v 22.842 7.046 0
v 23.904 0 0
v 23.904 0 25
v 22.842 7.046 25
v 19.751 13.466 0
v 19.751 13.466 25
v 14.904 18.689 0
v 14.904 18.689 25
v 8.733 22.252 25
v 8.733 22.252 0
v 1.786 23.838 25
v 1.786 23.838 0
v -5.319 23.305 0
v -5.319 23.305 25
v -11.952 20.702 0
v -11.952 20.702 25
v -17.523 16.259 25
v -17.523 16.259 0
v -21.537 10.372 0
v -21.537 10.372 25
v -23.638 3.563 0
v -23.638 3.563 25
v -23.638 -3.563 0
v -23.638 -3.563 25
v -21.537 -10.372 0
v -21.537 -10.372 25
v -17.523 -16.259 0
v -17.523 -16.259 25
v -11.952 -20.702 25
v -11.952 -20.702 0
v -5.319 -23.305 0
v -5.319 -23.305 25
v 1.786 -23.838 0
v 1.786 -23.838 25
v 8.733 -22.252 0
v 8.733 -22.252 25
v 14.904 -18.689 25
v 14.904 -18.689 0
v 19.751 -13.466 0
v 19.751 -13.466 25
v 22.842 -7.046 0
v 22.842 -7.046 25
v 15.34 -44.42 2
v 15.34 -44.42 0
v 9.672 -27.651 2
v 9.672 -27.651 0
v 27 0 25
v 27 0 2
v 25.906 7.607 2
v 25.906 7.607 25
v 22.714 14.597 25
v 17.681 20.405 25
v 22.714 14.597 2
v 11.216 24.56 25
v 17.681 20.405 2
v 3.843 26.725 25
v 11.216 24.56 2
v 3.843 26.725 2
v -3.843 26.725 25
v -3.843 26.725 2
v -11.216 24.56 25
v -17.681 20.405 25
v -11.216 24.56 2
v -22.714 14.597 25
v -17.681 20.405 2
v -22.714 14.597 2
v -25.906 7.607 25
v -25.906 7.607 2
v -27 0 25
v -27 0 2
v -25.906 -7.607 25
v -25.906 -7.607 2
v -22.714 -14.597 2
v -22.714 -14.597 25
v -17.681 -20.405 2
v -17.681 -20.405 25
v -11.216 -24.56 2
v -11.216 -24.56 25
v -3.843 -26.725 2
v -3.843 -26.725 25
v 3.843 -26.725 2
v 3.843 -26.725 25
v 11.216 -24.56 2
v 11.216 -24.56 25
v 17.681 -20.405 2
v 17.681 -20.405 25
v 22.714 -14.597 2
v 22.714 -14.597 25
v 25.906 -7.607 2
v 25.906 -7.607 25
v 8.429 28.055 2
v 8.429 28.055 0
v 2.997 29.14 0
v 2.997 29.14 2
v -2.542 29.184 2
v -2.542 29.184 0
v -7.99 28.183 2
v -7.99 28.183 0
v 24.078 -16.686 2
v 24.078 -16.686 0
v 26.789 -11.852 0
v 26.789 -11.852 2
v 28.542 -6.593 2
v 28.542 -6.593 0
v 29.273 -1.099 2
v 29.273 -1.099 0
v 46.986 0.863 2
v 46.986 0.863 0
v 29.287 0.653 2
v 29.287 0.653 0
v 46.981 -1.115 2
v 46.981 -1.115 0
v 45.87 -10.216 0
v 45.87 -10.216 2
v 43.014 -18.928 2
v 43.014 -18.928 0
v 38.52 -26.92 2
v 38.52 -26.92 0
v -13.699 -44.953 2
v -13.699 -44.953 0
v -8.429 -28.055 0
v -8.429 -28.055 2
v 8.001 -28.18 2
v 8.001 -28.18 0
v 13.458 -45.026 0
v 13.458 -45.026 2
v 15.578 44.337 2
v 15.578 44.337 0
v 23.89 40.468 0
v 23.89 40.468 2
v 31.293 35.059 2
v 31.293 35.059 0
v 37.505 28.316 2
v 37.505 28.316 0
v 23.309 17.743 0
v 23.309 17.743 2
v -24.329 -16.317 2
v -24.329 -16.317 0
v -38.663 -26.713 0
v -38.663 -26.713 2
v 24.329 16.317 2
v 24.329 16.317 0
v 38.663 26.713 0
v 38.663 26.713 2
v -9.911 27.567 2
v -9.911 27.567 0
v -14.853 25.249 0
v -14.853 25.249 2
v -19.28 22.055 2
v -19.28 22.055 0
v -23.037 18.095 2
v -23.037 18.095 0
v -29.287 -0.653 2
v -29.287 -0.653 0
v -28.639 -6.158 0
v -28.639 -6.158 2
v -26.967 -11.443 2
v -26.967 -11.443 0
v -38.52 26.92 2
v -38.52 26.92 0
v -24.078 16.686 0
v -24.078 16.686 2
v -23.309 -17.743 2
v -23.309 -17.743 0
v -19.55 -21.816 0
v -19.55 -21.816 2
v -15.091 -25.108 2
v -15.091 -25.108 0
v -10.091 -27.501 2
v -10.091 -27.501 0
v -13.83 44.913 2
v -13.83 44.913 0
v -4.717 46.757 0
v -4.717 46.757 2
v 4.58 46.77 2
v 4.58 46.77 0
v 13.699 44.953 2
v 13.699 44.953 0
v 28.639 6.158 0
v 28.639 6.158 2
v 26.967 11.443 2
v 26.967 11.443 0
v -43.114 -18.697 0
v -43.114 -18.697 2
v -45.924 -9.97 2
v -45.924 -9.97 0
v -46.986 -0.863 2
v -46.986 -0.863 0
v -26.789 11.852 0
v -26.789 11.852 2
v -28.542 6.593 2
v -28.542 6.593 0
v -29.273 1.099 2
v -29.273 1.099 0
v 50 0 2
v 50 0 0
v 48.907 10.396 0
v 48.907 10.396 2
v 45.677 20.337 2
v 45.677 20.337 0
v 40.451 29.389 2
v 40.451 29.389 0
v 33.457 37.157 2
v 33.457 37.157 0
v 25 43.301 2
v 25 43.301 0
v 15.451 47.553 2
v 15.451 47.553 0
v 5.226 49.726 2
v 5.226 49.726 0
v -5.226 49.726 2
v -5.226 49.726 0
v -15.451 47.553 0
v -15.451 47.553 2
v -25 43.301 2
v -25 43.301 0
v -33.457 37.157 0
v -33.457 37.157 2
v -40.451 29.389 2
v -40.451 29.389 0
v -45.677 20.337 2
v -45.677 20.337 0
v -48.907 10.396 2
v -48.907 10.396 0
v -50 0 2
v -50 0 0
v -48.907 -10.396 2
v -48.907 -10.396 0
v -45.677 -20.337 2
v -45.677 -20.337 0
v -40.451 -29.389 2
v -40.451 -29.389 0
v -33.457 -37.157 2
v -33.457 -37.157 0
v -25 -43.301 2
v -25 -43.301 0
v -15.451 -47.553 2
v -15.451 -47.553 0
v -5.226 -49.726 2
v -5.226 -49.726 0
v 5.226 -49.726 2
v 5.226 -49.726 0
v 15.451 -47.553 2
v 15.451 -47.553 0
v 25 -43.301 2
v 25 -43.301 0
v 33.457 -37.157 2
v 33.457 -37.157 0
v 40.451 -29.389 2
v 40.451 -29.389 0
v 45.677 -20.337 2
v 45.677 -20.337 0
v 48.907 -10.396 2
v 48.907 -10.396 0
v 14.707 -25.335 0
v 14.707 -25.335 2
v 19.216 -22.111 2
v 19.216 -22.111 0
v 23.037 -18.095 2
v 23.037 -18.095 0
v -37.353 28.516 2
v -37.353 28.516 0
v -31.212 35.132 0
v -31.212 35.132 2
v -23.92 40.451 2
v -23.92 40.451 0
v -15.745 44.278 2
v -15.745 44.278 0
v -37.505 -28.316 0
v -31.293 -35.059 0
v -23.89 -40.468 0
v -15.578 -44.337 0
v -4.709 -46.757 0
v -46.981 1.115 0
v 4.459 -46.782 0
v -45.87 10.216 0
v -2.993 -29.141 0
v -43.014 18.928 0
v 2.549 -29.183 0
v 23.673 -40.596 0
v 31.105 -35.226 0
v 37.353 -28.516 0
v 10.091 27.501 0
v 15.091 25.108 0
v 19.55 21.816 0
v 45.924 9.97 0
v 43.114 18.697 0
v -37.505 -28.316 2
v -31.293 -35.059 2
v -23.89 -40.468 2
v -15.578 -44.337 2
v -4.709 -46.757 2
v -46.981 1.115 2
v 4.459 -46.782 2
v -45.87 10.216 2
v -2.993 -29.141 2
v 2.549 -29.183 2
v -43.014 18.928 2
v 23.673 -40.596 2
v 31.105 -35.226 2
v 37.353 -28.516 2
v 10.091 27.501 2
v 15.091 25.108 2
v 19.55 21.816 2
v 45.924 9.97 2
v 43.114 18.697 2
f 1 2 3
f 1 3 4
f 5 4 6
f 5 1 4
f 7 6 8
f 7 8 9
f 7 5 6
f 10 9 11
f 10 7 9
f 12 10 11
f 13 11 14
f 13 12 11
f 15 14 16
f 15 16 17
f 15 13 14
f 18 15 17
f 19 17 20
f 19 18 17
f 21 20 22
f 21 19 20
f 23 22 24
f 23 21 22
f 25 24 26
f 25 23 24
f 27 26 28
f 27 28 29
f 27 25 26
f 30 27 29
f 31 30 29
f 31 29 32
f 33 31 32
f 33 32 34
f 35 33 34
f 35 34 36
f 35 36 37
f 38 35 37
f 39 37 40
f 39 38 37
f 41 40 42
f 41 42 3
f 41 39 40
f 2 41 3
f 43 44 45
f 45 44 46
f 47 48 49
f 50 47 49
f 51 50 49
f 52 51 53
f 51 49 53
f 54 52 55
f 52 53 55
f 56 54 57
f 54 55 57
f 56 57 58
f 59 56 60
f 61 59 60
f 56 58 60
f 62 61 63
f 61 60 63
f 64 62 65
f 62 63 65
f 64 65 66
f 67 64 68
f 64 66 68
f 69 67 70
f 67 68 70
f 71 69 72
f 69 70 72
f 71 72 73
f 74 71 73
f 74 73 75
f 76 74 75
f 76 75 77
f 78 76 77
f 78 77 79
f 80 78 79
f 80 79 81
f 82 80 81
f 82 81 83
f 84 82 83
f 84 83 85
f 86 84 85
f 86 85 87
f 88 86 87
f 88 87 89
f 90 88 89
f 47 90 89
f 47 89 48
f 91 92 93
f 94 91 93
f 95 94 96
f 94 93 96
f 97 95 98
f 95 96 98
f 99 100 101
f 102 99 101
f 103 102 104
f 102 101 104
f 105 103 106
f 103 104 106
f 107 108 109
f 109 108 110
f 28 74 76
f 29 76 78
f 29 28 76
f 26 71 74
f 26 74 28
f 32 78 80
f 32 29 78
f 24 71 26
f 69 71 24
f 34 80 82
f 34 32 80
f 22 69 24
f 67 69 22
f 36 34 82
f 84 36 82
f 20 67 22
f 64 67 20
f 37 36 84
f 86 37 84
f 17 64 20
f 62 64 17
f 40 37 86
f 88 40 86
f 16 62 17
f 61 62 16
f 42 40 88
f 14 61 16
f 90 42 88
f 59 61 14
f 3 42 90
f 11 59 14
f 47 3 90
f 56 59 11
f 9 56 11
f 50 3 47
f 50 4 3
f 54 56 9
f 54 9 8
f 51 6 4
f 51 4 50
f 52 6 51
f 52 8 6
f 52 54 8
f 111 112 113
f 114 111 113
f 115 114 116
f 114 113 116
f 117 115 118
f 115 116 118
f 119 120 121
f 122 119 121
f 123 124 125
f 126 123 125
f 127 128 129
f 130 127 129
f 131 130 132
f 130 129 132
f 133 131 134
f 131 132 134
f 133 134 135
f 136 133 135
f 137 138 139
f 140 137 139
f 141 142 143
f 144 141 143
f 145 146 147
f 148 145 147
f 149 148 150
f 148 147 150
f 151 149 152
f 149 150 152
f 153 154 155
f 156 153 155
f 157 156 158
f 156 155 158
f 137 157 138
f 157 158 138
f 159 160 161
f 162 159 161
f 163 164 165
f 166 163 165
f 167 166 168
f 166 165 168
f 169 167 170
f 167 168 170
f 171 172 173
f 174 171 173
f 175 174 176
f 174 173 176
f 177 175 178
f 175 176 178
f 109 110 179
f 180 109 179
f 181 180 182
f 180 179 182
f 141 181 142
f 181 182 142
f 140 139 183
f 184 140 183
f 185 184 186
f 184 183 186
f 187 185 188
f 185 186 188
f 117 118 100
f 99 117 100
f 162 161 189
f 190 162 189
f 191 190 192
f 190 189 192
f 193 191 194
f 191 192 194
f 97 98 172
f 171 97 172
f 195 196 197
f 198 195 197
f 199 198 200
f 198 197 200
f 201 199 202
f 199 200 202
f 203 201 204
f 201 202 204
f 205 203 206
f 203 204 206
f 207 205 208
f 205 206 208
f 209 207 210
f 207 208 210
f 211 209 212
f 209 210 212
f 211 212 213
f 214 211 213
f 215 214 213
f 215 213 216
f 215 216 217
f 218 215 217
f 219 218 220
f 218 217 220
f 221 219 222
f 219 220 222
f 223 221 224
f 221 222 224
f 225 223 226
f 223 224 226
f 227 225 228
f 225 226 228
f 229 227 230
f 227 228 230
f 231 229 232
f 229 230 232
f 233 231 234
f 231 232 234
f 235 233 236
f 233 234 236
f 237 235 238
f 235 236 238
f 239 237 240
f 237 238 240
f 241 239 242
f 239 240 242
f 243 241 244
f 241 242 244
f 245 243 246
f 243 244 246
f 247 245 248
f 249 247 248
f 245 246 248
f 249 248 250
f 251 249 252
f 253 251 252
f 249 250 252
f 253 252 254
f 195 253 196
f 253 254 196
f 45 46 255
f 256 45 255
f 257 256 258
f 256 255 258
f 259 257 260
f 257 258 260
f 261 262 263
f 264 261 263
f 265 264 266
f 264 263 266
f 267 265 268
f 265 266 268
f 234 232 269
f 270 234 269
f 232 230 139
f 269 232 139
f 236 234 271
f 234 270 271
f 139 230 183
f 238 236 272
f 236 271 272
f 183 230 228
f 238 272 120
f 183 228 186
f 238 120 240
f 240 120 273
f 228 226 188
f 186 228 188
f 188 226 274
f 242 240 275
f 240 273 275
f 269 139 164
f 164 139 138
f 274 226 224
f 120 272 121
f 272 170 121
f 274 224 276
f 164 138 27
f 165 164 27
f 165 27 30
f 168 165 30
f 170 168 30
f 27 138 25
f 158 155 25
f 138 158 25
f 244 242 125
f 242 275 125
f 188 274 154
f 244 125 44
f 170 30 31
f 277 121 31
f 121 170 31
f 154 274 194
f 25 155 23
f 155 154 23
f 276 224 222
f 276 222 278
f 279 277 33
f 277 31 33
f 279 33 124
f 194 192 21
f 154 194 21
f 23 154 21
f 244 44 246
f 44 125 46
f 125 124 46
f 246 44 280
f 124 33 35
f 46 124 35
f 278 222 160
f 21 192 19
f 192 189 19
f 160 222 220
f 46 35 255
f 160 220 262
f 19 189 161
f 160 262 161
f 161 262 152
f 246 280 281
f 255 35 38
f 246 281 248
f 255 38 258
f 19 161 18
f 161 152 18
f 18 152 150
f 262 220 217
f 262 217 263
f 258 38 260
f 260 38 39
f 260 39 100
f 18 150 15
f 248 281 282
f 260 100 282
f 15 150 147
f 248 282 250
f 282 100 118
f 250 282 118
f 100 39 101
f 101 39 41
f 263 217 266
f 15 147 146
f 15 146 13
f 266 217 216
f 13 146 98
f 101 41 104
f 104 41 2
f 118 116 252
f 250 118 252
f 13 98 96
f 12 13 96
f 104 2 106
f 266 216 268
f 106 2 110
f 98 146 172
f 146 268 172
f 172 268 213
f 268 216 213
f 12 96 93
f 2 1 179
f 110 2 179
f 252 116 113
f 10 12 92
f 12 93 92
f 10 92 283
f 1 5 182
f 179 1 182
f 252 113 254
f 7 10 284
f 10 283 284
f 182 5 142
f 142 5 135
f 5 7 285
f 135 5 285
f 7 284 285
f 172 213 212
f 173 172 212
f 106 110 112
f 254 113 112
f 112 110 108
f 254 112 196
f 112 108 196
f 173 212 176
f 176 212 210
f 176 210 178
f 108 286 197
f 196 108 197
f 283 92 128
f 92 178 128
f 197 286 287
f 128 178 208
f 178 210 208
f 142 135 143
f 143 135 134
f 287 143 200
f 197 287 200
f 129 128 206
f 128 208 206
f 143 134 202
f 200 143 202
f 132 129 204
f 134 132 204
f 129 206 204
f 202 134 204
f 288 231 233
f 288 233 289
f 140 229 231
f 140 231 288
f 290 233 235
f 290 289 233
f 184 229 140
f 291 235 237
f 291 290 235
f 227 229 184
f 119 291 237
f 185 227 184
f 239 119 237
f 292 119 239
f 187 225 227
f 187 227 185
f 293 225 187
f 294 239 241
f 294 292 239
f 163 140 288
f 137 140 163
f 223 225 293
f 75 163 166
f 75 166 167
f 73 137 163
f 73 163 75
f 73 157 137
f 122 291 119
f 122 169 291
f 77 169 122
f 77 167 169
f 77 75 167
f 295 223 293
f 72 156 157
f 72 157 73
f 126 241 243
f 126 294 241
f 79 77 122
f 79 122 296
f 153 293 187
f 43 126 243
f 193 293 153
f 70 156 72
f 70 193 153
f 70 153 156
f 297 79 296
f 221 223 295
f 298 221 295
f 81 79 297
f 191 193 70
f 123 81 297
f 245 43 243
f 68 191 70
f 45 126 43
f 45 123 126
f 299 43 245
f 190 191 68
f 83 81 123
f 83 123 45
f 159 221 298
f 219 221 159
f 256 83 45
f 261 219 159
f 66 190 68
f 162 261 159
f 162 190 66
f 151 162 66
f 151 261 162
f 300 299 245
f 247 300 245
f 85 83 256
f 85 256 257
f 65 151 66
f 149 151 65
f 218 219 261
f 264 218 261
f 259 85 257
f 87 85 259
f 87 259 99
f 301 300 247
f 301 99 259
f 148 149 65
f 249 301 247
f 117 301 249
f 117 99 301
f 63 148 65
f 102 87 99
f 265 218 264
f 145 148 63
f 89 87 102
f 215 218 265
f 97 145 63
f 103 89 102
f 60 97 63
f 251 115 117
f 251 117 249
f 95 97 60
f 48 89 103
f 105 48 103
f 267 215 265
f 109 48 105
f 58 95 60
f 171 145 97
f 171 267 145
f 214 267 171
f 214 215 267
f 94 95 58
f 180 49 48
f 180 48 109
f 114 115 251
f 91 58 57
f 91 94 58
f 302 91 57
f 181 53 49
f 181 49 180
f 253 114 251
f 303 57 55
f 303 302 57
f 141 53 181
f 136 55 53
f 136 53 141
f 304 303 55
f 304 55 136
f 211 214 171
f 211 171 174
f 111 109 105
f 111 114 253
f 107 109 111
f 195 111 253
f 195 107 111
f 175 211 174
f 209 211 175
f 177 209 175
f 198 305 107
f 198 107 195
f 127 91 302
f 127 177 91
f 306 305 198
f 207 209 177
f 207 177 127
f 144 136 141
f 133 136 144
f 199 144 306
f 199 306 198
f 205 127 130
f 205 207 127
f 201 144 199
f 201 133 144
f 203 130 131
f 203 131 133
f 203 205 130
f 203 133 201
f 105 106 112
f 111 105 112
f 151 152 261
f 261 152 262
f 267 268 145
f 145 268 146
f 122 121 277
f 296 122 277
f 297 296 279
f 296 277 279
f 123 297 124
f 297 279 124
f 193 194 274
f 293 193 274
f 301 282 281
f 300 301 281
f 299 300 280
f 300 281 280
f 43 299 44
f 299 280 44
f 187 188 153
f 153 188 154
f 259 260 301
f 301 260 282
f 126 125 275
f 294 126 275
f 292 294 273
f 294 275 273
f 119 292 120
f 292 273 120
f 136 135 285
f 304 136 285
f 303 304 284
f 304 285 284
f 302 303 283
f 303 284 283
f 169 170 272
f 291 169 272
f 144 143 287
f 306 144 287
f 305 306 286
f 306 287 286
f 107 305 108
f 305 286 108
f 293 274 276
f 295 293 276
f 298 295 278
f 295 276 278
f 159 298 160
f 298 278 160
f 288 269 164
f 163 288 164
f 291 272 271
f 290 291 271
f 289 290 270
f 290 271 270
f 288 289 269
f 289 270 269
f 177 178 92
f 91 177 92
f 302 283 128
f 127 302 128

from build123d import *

# Parameters (mm, degrees)
F0_R     = 50
F0_R_2   = 27
F1_DEPTH = 2
F2_R     = 27
F2_R_2   = 23.9045
F3_DEPTH = 25


with BuildPart() as f1:
    # F0 (on Top) → F1 (new body)
    with BuildSketch(Plane.XY):
        Circle(F0_R)
        with BuildLine():
            ThreePointArc((46.986111, 0.863073), (46.992056, 0.431555), (46.994037, 0))
            ThreePointArc((46.994037, 0), (46.990732, -0.55736), (46.980816, -1.114641))
            ThreePointArc((46.980816, -1.114641), (44.654947, -14.641558), (38.519864, -26.919502))
            ThreePointArc((38.519864, -26.919502), (37.944888, -27.724087), (37.35311, -28.516394))
            ThreePointArc((37.35311, -28.516394), (27.520519, -38.092789), (15.340338, -44.419743))
            ThreePointArc((15.340338, -44.419743), (14.40225, -44.732703), (13.457784, -45.025855))
            ThreePointArc((13.457784, -45.025855), (-0.125812, -46.993869), (-13.698676, -44.953151))
            ThreePointArc((-13.698676, -44.953151), (-14.641558, -44.654947), (-15.577957, -44.336969))
            ThreePointArc((-15.577957, -44.336969), (-27.724087, -37.944888), (-37.505261, -28.315984))
            ThreePointArc((-37.505261, -28.315984), (-38.092789, -27.520519), (-38.663448, -26.712868))
            ThreePointArc((-38.663448, -26.712868), (-44.732703, -14.40225), (-46.986111, -0.863073))
            ThreePointArc((-46.986111, -0.863073), (-46.993869, 0.125812), (-46.980816, 1.114641))
            ThreePointArc((-46.980816, 1.114641), (-44.654947, 14.641558), (-38.519864, 26.919502))
            ThreePointArc((-38.519864, 26.919502), (-37.944888, 27.724087), (-37.35311, 28.516394))
            ThreePointArc((-37.35311, 28.516394), (-27.694062, 37.966807), (-15.745097, 44.277889))
            ThreePointArc((-15.745097, 44.277889), (-14.791119, 44.605631), (-13.830327, 44.912822))
            ThreePointArc((-13.830327, 44.912822), (-0.068845, 46.993987), (13.698676, 44.953151))
            ThreePointArc((13.698676, 44.953151), (14.641558, 44.654947), (15.577957, 44.336969))
            ThreePointArc((15.577957, 44.336969), (27.724087, 37.944888), (37.505261, 28.315984))
            ThreePointArc((37.505261, 28.315984), (38.092789, 27.520519), (38.663448, 26.712868))
            ThreePointArc((38.663448, 26.712868), (44.732703, 14.40225), (46.986111, 0.863073))
        make_face(mode=Mode.SUBTRACT)
        with BuildLine():
            ThreePointArc((29.29399, 0), (29.292167, 0.326733), (29.286701, 0.653426))
            ThreePointArc((29.286701, 0.653426), (27.928294, 8.840148), (24.328572, 16.317426))
            ThreePointArc((24.328572, 16.317426), (23.82963, 17.037798), (23.309365, 17.742924))
            ThreePointArc((23.309365, 17.742924), (17.398356, 23.567669), (10.091086, 27.501051))
            ThreePointArc((10.091086, 27.501051), (9.264009, 27.790573), (8.428643, 28.055228))
            ThreePointArc((8.428643, 28.055228), (0.228608, 29.293098), (-7.989748, 28.18336))
            ThreePointArc((-7.989748, 28.18336), (-8.955604, 27.891486), (-9.910836, 27.566522))
            ThreePointArc((-9.910836, 27.566522), (-17.140909, 23.755569), (-23.036737, 18.095485))
            ThreePointArc((-23.036737, 18.095485), (-23.567669, 17.398356), (-24.077513, 16.685658))
            ThreePointArc((-24.077513, 16.685658), (-27.790573, 9.264009), (-29.273371, 1.098901))
            ThreePointArc((-29.273371, 1.098901), (-29.293142, 0.222837), (-29.286701, -0.653426))
            ThreePointArc((-29.286701, -0.653426), (-27.928294, -8.840148), (-24.328572, -16.317426))
            ThreePointArc((-24.328572, -16.317426), (-23.82963, -17.037798), (-23.309365, -17.742924))
            ThreePointArc((-23.309365, -17.742924), (-17.398356, -23.567669), (-10.091086, -27.501051))
            ThreePointArc((-10.091086, -27.501051), (-9.264009, -27.790573), (-8.428643, -28.055228))
            ThreePointArc((-8.428643, -28.055228), (-0.222837, -29.293142), (8.000852, -28.180209))
            ThreePointArc((8.000852, -28.180209), (8.840148, -27.928294), (9.671534, -27.651388))
            ThreePointArc((9.671534, -27.651388), (17.037798, -23.82963), (23.036737, -18.095485))
            ThreePointArc((23.036737, -18.095485), (23.567669, -17.398356), (24.077513, -16.685658))
            ThreePointArc((24.077513, -16.685658), (27.790573, -9.264009), (29.273371, -1.098901))
            ThreePointArc((29.273371, -1.098901), (29.288834, -0.549547), (29.29399, 0))
        make_face()
        Circle(F0_R_2, mode=Mode.SUBTRACT)
        with BuildLine():
            Line((-7.989748, 28.18336), (-13.830327, 44.912822))
            ThreePointArc((-13.830327, 44.912822), (-14.791119, 44.605631), (-15.745097, 44.277889))
            Line((-15.745097, 44.277889), (-9.910836, 27.566522))
            ThreePointArc((-9.910836, 27.566522), (-8.955604, 27.891486), (-7.989748, 28.18336))
        make_face()
        with BuildLine():
            Line((-23.036737, 18.095485), (-37.35311, 28.516394))
            ThreePointArc((-37.35311, 28.516394), (-37.944888, 27.724087), (-38.519864, 26.919502))
            Line((-38.519864, 26.919502), (-24.077513, 16.685658))
            ThreePointArc((-24.077513, 16.685658), (-23.567669, 17.398356), (-23.036737, 18.095485))
        make_face()
        with BuildLine():
            Line((-29.273371, 1.098901), (-46.980816, 1.114641))
            ThreePointArc((-46.980816, 1.114641), (-46.993869, 0.125812), (-46.986111, -0.863073))
            Line((-46.986111, -0.863073), (-29.286701, -0.653426))
            ThreePointArc((-29.286701, -0.653426), (-29.293142, 0.222837), (-29.273371, 1.098901))
        make_face()
        with BuildLine():
            ThreePointArc((-38.663448, -26.712868), (-38.092789, -27.520519), (-37.505261, -28.315984))
            Line((-37.505261, -28.315984), (-23.309365, -17.742924))
            ThreePointArc((-23.309365, -17.742924), (-23.82963, -17.037798), (-24.328572, -16.317426))
            Line((-24.328572, -16.317426), (-38.663448, -26.712868))
        make_face()
        with BuildLine():
            ThreePointArc((-15.577957, -44.336969), (-14.641558, -44.654947), (-13.698676, -44.953151))
            Line((-13.698676, -44.953151), (-8.428643, -28.055228))
            ThreePointArc((-8.428643, -28.055228), (-9.264009, -27.790573), (-10.091086, -27.501051))
            Line((-10.091086, -27.501051), (-15.577957, -44.336969))
        make_face()
        with BuildLine():
            ThreePointArc((13.457784, -45.025855), (14.40225, -44.732703), (15.340338, -44.419743))
            Line((15.340338, -44.419743), (9.671534, -27.651388))
            ThreePointArc((9.671534, -27.651388), (8.840148, -27.928294), (8.000852, -28.180209))
            Line((8.000852, -28.180209), (13.457784, -45.025855))
        make_face()
        with BuildLine():
            ThreePointArc((37.35311, -28.516394), (37.944888, -27.724087), (38.519864, -26.919502))
            Line((38.519864, -26.919502), (24.077513, -16.685658))
            ThreePointArc((24.077513, -16.685658), (23.567669, -17.398356), (23.036737, -18.095485))
            Line((23.036737, -18.095485), (37.35311, -28.516394))
        make_face()
        with BuildLine():
            ThreePointArc((46.980816, -1.114641), (46.990732, -0.55736), (46.994037, 0))
            ThreePointArc((46.994037, 0), (46.992056, 0.431555), (46.986111, 0.863073))
            Line((46.986111, 0.863073), (29.286701, 0.653426))
            ThreePointArc((29.286701, 0.653426), (29.292167, 0.326733), (29.29399, 0))
            ThreePointArc((29.29399, 0), (29.288834, -0.549547), (29.273371, -1.098901))
            Line((29.273371, -1.098901), (46.980816, -1.114641))
        make_face()
        with BuildLine():
            Line((24.328572, 16.317426), (38.663448, 26.712868))
            ThreePointArc((38.663448, 26.712868), (38.092789, 27.520519), (37.505261, 28.315984))
            Line((37.505261, 28.315984), (23.309365, 17.742924))
            ThreePointArc((23.309365, 17.742924), (23.82963, 17.037798), (24.328572, 16.317426))
        make_face()
        with BuildLine():
            Line((10.091086, 27.501051), (15.577957, 44.336969))
            ThreePointArc((15.577957, 44.336969), (14.641558, 44.654947), (13.698676, 44.953151))
            Line((13.698676, 44.953151), (8.428643, 28.055228))
            ThreePointArc((8.428643, 28.055228), (9.264009, 27.790573), (10.091086, 27.501051))
        make_face()
    extrude(amount=F1_DEPTH)

    # F2 (on Top) → F3 (join)
    with BuildSketch(Plane.XY):
        Circle(F2_R)
        Circle(F2_R_2, mode=Mode.SUBTRACT)
    extrude(amount=F3_DEPTH)


solid = f1.part
